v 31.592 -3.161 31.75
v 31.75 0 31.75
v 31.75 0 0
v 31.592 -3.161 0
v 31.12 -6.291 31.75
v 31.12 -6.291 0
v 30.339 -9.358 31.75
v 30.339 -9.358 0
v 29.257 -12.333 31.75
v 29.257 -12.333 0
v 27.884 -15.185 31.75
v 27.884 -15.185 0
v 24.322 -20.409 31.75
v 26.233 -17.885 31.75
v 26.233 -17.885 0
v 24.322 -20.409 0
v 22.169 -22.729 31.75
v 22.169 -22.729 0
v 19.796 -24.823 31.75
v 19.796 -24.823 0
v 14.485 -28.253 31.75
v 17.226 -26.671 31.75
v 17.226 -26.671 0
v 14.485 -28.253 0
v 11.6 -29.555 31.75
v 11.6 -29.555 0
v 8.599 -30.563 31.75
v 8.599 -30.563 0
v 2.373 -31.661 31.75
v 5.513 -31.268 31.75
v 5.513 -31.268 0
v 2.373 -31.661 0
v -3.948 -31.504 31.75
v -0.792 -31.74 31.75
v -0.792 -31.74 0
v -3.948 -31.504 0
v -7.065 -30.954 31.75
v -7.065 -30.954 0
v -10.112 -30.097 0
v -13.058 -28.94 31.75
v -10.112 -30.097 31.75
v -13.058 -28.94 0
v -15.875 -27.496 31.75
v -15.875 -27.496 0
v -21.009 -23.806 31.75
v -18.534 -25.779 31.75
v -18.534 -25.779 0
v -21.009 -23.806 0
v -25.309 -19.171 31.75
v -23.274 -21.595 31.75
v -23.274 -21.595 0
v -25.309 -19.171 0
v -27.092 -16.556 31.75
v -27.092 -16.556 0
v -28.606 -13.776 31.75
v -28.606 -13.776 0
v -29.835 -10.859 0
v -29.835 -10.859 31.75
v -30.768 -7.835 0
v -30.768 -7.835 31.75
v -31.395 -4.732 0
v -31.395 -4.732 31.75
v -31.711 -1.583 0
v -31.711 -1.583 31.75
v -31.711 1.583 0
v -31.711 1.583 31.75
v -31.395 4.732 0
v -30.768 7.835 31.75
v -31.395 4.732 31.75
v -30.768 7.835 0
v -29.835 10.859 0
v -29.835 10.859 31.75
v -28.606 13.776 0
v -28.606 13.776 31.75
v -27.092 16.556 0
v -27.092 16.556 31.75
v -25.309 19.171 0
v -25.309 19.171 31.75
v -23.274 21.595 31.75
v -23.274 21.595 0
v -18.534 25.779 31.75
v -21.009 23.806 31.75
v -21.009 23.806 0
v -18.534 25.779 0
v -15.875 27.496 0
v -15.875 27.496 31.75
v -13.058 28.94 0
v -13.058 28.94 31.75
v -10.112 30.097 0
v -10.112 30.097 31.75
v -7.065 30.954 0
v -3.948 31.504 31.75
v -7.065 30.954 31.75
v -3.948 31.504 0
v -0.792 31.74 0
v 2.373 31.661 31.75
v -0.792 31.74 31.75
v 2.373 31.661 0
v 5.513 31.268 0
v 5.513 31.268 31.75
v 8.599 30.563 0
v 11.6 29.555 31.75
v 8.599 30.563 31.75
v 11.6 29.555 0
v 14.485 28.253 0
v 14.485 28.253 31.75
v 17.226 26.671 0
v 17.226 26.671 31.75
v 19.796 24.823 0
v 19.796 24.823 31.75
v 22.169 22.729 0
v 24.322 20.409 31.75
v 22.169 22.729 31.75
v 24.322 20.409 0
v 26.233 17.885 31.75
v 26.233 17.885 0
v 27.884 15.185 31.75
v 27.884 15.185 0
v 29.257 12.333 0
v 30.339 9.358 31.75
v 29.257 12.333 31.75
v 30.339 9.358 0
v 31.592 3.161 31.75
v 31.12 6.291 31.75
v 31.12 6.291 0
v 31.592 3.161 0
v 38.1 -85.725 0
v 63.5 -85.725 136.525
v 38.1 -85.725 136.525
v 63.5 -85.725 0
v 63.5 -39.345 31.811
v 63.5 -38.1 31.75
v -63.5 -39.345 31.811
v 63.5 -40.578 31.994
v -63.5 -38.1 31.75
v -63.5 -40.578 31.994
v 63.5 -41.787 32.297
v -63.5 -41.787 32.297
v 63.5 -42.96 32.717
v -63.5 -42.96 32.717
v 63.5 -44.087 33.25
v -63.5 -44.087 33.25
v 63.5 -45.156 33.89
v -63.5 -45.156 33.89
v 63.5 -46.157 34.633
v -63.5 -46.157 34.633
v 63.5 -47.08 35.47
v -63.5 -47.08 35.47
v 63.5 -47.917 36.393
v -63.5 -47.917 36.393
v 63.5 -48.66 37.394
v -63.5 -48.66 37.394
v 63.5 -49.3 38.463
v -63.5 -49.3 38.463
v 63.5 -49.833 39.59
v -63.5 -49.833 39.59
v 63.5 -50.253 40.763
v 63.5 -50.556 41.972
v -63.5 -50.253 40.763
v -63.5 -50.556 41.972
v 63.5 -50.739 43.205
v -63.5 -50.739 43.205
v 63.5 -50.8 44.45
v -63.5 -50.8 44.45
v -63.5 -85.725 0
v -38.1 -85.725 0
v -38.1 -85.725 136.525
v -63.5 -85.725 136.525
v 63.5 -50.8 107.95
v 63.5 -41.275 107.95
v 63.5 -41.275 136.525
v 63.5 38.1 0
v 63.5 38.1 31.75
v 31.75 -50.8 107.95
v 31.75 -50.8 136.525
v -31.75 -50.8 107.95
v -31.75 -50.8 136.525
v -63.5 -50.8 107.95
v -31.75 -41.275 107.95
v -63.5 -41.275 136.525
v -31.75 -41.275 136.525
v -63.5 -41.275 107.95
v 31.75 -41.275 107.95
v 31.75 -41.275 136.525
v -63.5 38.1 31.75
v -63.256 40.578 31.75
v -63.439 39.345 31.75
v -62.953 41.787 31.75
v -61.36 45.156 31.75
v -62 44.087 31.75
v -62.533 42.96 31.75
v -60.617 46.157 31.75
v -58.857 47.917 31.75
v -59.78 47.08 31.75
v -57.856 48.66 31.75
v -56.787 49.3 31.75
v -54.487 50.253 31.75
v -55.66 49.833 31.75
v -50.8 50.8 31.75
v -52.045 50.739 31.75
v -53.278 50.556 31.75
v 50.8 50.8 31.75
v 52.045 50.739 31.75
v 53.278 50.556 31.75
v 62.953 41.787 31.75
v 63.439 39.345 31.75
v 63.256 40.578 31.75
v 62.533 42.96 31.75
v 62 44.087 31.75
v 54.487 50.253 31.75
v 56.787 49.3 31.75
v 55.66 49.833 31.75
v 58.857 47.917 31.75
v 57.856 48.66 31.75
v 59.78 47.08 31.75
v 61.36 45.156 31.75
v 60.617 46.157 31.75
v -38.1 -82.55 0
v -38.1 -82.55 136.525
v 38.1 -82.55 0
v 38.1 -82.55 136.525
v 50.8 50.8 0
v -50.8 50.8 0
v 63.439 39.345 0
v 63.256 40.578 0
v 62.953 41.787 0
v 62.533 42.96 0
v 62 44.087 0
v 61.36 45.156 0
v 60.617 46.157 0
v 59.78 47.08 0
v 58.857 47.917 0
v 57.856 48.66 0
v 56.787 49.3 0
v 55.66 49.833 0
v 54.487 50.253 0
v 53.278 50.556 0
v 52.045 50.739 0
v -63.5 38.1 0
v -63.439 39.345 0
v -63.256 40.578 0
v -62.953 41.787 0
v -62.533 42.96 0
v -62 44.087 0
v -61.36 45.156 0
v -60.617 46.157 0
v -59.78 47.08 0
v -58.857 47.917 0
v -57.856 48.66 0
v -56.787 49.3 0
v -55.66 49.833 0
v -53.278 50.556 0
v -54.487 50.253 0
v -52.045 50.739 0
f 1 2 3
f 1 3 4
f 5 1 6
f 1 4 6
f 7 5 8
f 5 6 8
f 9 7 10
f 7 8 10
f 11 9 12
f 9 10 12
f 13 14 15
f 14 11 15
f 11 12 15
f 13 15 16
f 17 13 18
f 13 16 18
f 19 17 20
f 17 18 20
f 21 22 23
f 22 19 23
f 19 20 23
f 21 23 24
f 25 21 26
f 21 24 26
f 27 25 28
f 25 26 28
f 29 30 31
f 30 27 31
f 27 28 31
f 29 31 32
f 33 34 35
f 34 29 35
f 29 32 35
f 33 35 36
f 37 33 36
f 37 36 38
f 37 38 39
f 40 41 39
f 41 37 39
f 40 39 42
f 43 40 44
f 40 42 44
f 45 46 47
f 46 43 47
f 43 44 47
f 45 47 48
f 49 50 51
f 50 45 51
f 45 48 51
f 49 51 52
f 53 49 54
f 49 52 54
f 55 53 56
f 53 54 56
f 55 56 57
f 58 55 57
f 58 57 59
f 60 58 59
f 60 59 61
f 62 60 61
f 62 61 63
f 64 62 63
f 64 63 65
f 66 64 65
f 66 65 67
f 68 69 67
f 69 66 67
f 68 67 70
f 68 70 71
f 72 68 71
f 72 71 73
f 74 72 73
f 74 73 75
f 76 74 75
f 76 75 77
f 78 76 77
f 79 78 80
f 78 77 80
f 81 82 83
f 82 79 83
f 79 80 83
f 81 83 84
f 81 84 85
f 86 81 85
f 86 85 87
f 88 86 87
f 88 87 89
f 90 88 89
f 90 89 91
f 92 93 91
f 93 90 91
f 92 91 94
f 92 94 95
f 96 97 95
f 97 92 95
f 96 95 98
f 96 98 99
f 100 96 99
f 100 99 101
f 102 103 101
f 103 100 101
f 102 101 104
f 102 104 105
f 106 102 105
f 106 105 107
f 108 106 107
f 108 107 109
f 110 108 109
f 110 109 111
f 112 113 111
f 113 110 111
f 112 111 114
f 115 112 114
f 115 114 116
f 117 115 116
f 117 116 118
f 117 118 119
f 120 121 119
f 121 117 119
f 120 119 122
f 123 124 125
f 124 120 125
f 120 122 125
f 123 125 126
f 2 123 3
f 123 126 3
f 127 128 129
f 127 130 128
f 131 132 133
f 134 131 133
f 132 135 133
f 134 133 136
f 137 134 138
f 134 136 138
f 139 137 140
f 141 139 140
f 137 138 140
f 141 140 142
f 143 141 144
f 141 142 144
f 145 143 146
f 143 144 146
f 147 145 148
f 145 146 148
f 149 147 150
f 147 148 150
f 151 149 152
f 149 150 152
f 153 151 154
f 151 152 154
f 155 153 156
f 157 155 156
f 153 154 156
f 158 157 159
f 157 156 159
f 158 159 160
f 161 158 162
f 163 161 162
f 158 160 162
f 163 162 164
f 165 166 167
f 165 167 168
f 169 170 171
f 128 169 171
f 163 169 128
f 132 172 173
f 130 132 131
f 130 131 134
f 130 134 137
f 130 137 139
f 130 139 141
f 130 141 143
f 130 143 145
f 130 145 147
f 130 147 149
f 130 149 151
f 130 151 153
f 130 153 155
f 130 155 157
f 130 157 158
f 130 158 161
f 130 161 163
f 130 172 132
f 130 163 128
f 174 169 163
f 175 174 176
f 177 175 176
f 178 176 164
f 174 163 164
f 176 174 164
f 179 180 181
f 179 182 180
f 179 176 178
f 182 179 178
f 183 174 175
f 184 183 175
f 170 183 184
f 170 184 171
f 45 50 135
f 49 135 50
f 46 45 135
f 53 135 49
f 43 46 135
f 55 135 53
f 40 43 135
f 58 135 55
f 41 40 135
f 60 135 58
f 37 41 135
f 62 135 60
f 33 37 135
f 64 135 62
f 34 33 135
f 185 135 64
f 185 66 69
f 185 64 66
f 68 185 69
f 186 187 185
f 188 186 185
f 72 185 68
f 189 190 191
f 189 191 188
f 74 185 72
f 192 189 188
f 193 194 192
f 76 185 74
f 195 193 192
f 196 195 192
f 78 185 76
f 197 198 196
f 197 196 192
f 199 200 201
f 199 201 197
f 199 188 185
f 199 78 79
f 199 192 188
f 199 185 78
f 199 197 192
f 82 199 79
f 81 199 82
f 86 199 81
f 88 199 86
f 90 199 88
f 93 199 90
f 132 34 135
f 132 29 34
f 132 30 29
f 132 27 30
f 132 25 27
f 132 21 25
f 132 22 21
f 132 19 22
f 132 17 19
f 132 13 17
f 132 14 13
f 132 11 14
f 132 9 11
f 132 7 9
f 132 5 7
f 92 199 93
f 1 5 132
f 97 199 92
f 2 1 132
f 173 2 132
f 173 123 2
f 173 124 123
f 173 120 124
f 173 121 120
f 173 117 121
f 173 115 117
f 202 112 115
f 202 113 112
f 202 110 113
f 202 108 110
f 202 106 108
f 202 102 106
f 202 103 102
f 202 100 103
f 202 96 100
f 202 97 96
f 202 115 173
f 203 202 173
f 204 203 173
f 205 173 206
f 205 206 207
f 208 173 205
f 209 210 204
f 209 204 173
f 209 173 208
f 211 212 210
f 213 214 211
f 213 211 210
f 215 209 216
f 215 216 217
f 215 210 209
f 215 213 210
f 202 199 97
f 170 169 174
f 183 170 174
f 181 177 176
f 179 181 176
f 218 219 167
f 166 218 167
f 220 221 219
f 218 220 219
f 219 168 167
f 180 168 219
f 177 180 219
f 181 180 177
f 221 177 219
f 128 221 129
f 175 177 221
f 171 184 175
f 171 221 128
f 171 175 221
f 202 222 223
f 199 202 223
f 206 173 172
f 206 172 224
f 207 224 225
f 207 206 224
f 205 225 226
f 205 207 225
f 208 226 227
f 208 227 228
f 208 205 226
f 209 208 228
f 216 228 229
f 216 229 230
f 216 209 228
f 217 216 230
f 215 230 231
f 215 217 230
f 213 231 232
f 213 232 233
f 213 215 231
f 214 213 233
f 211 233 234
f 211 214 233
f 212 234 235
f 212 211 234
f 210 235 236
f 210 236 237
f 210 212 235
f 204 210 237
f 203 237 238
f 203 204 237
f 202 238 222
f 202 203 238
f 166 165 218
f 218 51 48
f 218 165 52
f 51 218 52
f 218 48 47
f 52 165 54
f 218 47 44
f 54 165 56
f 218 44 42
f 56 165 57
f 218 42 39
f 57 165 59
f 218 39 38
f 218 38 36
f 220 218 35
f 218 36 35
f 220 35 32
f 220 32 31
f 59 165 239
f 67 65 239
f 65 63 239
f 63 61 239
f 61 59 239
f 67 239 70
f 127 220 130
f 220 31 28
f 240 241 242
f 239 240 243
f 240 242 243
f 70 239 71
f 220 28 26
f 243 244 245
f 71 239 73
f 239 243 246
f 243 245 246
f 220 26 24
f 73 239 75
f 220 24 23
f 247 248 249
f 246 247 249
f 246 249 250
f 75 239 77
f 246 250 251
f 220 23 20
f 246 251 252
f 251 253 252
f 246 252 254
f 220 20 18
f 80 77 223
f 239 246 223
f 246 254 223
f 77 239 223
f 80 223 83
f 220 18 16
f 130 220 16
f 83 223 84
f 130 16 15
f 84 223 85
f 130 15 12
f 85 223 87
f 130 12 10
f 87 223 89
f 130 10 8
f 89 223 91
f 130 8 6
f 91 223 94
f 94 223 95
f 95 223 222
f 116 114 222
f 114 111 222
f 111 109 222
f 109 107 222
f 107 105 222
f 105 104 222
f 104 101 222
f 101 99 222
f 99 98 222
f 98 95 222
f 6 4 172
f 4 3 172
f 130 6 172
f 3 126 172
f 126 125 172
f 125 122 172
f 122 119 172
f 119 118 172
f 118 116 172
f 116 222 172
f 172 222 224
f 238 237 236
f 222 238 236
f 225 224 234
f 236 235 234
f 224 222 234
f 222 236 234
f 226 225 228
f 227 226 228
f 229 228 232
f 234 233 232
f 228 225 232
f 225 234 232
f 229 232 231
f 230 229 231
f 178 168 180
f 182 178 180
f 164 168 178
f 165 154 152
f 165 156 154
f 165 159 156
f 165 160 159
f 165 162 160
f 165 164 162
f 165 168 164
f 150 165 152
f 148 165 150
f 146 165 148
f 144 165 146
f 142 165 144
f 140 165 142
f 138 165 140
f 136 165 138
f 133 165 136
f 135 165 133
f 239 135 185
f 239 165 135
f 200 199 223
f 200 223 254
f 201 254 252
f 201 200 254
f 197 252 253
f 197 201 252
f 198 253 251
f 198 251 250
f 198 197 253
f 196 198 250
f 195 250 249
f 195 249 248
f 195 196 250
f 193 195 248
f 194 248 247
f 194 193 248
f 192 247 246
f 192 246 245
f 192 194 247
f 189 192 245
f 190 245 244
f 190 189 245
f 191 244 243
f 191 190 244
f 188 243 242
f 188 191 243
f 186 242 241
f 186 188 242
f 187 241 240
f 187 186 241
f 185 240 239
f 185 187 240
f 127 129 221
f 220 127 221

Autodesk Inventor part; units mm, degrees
ref_plane "YZ Plane" through (0, 0, 0) normal (1, 0, 0) x (0, 1, 0)
ref_plane "XZ Plane" through (0, 0, 0) normal (0, 1, 0) x (-1, 0, 0)
ref_plane "XY Plane" through (0, 0, 0) normal (0, 0, 1) x (1, 0, 0)
sketch "Sketch4" plane through (0, 0, 0) normal (0, 0, 1) x (1, 0, 0)
  circle A0 centre (0, 0) radius 31.75
  line L0 (-63.5, -50.8) -> (63.5, -50.8) construction
  line L1 (63.5, -50.8) -> (63.5, 50.8)
  line L2 (63.5, 50.8) -> (-63.5, 50.8)
  line L3 (-63.5, 50.8) -> (-63.5, -50.8)
  line L4 (-63.5, -50.8) -> (63.5, 50.8) construction
  line L5 (63.5, -50.8) -> (-63.5, 50.8) construction
  line L6 (-63.5, -50.8) -> (63.5, -50.8) construction
  line L7 (63.5, -50.8) -> (63.5, -85.725)
  line L8 (63.5, -85.725) -> (-63.5, -85.725)
  line L9 (-63.5, -85.725) -> (-63.5, -50.8)
  dimension "d2" = 127
  dimension "d3" = 101.6
  dimension "d4" = 63.5
  dimension "d5" = 136.525
extrude "Extrusion1" add sketch "Sketch4" along normal blind 31.75
sketch "Sketch5" plane through (0, 0, 31.75) normal (0, 0, 1) x (1, 0, 0)
  line L0 (-63.5, 50.8) -> (-63.5, -85.725) projected
  line L1 (-63.5, -85.725) -> (63.5, -85.725)
  line L2 (63.5, -85.725) -> (63.5, -41.275)
  line L3 (63.5, -41.275) -> (-63.5, -41.275)
  line L4 (-63.5, -41.275) -> (-63.5, -85.725)
  line L5 (63.5, -85.725) -> (63.5, 50.8) projected
  line L6 (-63.5, -41.275) -> (63.5, -41.275)
  line L7 (63.5, -41.275) -> (63.5, -50.8)
  line L8 (63.5, -50.8) -> (-63.5, -50.8)
  line L9 (-63.5, -50.8) -> (-63.5, -41.275)
  point P0 (0, 0)
  point P1 (-63.5, -50.8)
  dimension "d8" = 44.45
  dimension "d9" = 9.525
extrude "Extrusion2" add sketch "Sketch5" along normal blind 104.775 contours L8 L2 L1 L0
sketch "Sketch6" plane through (0, 0, 136.525) normal (0, 0, 1) x (1, 0, 0)
  line L0 (-63.5, -85.725) -> (63.5, -85.725) projected
  line L1 (-38.1, -85.725) -> (38.1, -85.725)
  line L2 (38.1, -85.725) -> (38.1, -82.55)
  line L3 (38.1, -82.55) -> (-38.1, -82.55)
  line L4 (-38.1, -82.55) -> (-38.1, -85.725)
  line L5 (-63.5, -50.8) -> (-63.5, -85.725) projected
  point P0 (0, 0)
  dimension "d12" = 3.175
  dimension "d13" = 25.4
  dimension "d14" = 76.2
extrude "Extrusion3" cut sketch "Sketch6" against normal through all
sketch "Sketch7" plane through (-63.5, -50.8, 31.75) normal (0, 1, 0) x (1, 0, 0)
  line L0 (127, -104.775) -> (0, -104.775) projected
  line L1 (0, -104.775) -> (31.75, -104.775)
  line L2 (31.75, -104.775) -> (31.75, -76.2)
  line L3 (31.75, -76.2) -> (0, -76.2)
  line L4 (0, -76.2) -> (0, -104.775)
  line L5 (127, 31.75) -> (127, -104.775) projected
  line L6 (95.25, -104.775) -> (127, -104.775)
  line L7 (127, -104.775) -> (127, -76.2)
  line L8 (127, -76.2) -> (95.25, -76.2)
  line L9 (95.25, -76.2) -> (95.25, -104.775)
  line L10 (0, 0) -> (127, 0) projected
  point P0 (63.5, 31.75)
  dimension "d17" = 63.5
  dimension "d18" = 76.2
extrude "Extrusion4" add sketch "Sketch7" along normal blind 9.525
fillet "Fillet1" radius 12.7 3 edges at (63.5, 50.8, 15.875) (-63.5, 50.8, 15.875) (0, -50.8, 31.75)
properties part number "TubeMount"
